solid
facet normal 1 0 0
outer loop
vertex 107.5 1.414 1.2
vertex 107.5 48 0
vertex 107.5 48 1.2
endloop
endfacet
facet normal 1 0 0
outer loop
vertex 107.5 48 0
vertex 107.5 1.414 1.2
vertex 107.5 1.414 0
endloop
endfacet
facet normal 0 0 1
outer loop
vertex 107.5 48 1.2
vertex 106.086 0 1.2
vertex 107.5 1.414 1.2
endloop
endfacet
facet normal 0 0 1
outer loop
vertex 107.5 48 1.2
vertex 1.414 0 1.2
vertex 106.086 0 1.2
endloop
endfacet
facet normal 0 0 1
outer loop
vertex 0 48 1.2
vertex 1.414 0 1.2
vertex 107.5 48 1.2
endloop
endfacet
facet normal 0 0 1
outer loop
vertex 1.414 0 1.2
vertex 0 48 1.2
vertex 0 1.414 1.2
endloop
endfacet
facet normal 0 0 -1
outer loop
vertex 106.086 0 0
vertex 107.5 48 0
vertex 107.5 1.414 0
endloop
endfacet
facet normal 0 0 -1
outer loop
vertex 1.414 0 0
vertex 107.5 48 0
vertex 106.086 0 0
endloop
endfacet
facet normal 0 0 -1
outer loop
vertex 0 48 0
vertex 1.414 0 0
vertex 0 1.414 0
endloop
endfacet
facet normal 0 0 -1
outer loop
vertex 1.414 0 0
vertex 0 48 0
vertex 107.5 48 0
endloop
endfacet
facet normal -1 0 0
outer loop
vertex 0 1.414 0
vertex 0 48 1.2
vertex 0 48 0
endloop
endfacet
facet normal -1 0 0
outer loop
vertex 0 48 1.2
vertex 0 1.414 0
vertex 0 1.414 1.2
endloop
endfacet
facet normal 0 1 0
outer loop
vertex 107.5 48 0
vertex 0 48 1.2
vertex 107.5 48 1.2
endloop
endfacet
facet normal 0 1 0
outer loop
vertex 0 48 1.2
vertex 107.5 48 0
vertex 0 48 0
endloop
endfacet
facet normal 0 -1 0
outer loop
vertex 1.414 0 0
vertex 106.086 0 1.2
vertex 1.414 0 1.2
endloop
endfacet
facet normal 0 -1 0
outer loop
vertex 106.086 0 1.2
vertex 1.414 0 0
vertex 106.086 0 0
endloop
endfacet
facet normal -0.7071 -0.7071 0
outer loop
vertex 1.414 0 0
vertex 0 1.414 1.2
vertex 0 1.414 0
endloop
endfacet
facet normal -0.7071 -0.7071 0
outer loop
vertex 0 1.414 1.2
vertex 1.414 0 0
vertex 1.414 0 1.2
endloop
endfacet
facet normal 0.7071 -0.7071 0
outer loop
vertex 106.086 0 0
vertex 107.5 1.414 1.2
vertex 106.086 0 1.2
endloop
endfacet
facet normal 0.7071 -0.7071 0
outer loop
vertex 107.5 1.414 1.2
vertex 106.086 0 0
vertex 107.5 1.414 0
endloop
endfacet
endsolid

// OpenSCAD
//*small
width = 51;
height = 30;
depth = 1.8;
//*/

//*large
width = 107.5;
height = 48;
depth = 1.2;
//*/


difference() {
  cube([width,height,depth]);
  rotate([0,0,45]) translate([-1,-1,0]) cube([2,2,10]);
  translate([width,0,0]) rotate([0,0,45]) translate([-1,-1,0]) cube([2,2,10]);
}
